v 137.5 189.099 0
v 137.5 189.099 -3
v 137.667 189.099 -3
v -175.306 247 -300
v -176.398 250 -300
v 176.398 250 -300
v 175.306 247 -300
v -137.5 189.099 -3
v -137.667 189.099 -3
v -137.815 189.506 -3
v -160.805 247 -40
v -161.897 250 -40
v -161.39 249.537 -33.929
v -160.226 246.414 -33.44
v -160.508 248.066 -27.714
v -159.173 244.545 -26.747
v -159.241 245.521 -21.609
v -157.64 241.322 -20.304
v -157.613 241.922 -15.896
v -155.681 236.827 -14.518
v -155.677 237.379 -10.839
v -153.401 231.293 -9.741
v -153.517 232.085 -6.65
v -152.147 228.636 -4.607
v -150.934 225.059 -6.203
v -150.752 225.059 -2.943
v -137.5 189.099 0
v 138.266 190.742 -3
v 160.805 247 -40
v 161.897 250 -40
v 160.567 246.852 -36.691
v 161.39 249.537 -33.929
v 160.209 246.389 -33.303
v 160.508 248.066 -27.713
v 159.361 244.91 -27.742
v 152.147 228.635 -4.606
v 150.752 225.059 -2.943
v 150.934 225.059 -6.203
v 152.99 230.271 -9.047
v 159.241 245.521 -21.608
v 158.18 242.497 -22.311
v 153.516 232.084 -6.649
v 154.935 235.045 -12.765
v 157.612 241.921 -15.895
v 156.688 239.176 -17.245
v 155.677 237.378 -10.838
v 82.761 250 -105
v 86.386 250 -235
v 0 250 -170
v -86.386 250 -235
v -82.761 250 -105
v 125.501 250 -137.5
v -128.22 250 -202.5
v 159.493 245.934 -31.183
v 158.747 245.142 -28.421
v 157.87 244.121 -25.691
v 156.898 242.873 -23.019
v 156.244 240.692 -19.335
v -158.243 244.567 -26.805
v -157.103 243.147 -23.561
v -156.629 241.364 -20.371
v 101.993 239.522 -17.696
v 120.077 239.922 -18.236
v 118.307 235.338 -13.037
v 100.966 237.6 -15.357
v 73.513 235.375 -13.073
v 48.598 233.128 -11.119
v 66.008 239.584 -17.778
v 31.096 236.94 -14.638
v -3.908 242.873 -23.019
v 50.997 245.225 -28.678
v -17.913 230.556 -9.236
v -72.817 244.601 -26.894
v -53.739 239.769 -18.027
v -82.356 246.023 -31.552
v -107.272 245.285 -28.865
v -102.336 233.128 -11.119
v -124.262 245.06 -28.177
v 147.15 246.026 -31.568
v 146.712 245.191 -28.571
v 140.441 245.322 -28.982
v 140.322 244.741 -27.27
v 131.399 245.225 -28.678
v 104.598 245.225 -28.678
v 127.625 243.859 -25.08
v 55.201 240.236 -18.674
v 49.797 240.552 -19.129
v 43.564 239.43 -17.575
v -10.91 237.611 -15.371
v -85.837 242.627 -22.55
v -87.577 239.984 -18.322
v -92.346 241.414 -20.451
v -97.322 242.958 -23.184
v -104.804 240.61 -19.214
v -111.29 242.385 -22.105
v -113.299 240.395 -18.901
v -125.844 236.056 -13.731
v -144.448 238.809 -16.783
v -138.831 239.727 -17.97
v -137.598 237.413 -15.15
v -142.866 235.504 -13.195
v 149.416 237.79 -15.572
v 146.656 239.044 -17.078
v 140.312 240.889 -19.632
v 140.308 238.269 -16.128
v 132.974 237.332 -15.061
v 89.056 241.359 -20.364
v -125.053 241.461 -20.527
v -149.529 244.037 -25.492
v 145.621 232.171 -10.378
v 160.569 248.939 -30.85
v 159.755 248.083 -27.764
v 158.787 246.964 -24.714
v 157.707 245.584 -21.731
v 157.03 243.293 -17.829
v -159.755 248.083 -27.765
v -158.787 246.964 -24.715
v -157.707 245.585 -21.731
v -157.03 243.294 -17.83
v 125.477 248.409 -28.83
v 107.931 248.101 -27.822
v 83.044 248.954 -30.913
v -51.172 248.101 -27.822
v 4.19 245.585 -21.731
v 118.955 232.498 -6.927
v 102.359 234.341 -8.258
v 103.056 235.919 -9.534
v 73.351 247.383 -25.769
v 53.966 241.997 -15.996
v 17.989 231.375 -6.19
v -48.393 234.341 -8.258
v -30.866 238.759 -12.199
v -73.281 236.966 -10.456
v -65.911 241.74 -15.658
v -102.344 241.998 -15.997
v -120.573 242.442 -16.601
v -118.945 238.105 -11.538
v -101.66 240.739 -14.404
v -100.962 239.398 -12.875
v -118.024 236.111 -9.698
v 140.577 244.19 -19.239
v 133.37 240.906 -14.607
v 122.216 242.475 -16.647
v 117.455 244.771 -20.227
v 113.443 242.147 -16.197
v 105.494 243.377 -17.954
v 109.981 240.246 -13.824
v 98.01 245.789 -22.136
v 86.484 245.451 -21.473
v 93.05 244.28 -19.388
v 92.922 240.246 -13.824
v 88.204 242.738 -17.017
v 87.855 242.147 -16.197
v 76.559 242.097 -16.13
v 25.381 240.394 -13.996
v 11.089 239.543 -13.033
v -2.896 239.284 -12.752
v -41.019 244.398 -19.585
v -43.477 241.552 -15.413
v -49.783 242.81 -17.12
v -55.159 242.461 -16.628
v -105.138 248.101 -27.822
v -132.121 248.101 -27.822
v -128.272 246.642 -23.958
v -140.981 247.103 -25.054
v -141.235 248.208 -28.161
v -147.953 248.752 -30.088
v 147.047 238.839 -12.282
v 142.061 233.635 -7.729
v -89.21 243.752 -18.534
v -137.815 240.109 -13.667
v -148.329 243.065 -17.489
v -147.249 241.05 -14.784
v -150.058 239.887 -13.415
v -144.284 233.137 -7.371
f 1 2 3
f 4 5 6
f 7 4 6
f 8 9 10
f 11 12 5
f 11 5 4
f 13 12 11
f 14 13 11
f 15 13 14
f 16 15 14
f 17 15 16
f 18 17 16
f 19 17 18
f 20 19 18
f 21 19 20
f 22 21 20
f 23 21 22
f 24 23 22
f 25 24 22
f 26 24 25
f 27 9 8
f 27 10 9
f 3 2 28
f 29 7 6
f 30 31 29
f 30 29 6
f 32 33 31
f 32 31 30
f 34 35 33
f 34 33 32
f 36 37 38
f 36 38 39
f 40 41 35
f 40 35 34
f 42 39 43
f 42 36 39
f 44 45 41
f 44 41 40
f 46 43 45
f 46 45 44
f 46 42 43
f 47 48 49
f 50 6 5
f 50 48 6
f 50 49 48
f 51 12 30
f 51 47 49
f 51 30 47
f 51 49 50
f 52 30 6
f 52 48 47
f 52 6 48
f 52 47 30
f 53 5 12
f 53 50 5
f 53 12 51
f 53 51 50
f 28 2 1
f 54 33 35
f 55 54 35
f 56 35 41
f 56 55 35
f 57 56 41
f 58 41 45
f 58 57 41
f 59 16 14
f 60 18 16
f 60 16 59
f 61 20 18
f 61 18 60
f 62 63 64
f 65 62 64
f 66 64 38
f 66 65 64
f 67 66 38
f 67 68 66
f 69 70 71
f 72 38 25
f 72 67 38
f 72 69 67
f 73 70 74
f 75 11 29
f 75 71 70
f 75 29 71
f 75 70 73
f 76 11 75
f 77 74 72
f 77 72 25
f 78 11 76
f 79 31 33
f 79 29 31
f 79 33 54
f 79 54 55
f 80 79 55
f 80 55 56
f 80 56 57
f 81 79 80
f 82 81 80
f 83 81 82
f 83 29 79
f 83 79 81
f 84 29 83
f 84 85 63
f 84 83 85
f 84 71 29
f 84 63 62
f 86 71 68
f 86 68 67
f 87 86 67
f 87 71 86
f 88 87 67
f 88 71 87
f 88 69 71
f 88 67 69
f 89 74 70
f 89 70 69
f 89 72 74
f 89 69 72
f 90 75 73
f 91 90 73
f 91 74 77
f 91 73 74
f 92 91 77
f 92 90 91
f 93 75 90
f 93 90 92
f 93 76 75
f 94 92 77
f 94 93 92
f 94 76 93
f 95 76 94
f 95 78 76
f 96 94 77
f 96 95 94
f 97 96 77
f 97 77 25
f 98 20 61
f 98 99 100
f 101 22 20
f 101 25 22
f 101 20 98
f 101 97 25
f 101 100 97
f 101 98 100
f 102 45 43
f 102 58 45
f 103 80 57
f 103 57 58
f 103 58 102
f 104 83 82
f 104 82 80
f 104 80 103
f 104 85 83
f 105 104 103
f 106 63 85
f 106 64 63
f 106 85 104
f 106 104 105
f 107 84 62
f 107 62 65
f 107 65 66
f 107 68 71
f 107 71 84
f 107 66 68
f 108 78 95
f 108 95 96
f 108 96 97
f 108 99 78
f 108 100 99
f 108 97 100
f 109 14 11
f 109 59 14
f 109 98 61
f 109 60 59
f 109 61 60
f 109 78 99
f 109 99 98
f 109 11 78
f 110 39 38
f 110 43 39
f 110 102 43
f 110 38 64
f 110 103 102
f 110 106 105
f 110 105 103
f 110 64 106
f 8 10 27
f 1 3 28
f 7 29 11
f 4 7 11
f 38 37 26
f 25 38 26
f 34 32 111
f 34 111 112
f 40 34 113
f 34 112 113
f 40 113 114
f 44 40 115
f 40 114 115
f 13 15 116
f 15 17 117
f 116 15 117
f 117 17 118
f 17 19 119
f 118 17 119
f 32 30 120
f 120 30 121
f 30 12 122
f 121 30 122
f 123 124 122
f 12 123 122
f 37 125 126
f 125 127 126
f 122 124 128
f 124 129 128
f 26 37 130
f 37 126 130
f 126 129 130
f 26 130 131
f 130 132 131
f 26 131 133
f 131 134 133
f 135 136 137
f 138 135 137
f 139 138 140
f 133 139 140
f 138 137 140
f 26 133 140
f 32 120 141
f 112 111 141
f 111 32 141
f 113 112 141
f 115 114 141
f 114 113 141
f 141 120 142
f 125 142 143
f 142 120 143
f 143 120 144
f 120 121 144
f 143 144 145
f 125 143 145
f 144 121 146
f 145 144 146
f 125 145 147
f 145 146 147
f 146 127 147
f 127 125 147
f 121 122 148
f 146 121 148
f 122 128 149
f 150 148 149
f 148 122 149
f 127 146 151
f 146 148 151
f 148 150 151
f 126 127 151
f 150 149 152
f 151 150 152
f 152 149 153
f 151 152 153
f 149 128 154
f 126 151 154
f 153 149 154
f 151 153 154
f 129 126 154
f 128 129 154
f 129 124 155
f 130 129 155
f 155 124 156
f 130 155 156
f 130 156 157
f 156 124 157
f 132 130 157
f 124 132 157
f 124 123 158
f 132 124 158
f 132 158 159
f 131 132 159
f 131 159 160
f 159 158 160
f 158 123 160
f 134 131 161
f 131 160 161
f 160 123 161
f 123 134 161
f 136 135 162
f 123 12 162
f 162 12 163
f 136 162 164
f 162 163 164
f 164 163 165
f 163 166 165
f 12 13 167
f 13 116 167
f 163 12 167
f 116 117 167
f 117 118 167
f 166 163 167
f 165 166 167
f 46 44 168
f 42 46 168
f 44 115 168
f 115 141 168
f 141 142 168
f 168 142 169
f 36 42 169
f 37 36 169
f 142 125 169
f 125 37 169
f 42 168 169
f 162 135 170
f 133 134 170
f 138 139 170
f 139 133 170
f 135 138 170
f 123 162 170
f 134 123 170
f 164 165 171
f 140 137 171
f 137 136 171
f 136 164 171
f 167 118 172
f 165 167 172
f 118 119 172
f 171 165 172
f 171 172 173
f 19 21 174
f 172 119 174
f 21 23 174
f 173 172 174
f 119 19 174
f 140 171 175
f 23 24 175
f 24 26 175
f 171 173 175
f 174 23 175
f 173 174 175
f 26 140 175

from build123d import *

# Parameters (mm, degrees)
FILLET1_R          = 40
SHELL2_T           = -3
CUT_EXTRUDE1_DEPTH = 30


with BuildPart() as part:
    # Sketch2 → Loft1 section 0
    with BuildSketch(Plane.XY.offset(-300)):
        Polygon((-154.231358145, 189.098565855), (154.231358145, 189.098565855), (176.397667398, 250), (-176.397667398, 250), align=None)
    # Sketch1 → Loft1 section 1
    with BuildSketch(Plane.XY):
        Polygon((-159.666309253, 250), (-137.5, 189.098565855), (137.5, 189.098565855), (159.666309253, 250), align=None)
    loft()

    # Fillet1
    fillet1_edges = [part.edges().sort_by_distance(p)[0] for p in [
        (0, 250, 0),
    ]]
    fillet(fillet1_edges, radius=FILLET1_R)

    # Shell2
    shell2_openings = [part.faces().sort_by_distance(p)[0] for p in [
        (0, 219.549282927, -300),
        (-159.448338541, 221.819713171, -180),
        (-72.932839536, 189.098565855, -225),
        (156.851508139, 213.459139513, -188),
    ]]
    offset(amount=SHELL2_T, openings=shell2_openings, kind=Kind.INTERSECTION)

    # Sketch4 → Cut-Extrude1 (cut)
    with BuildSketch(Plane.XY):
        Polygon((-137.5, 189.098565855), (137.5, 189.098565855), (154.249008644, 225.058565855), (-165.371779032, 225.058565855), align=None)
    extrude(amount=-CUT_EXTRUDE1_DEPTH, mode=Mode.SUBTRACT)


solid = part.part
